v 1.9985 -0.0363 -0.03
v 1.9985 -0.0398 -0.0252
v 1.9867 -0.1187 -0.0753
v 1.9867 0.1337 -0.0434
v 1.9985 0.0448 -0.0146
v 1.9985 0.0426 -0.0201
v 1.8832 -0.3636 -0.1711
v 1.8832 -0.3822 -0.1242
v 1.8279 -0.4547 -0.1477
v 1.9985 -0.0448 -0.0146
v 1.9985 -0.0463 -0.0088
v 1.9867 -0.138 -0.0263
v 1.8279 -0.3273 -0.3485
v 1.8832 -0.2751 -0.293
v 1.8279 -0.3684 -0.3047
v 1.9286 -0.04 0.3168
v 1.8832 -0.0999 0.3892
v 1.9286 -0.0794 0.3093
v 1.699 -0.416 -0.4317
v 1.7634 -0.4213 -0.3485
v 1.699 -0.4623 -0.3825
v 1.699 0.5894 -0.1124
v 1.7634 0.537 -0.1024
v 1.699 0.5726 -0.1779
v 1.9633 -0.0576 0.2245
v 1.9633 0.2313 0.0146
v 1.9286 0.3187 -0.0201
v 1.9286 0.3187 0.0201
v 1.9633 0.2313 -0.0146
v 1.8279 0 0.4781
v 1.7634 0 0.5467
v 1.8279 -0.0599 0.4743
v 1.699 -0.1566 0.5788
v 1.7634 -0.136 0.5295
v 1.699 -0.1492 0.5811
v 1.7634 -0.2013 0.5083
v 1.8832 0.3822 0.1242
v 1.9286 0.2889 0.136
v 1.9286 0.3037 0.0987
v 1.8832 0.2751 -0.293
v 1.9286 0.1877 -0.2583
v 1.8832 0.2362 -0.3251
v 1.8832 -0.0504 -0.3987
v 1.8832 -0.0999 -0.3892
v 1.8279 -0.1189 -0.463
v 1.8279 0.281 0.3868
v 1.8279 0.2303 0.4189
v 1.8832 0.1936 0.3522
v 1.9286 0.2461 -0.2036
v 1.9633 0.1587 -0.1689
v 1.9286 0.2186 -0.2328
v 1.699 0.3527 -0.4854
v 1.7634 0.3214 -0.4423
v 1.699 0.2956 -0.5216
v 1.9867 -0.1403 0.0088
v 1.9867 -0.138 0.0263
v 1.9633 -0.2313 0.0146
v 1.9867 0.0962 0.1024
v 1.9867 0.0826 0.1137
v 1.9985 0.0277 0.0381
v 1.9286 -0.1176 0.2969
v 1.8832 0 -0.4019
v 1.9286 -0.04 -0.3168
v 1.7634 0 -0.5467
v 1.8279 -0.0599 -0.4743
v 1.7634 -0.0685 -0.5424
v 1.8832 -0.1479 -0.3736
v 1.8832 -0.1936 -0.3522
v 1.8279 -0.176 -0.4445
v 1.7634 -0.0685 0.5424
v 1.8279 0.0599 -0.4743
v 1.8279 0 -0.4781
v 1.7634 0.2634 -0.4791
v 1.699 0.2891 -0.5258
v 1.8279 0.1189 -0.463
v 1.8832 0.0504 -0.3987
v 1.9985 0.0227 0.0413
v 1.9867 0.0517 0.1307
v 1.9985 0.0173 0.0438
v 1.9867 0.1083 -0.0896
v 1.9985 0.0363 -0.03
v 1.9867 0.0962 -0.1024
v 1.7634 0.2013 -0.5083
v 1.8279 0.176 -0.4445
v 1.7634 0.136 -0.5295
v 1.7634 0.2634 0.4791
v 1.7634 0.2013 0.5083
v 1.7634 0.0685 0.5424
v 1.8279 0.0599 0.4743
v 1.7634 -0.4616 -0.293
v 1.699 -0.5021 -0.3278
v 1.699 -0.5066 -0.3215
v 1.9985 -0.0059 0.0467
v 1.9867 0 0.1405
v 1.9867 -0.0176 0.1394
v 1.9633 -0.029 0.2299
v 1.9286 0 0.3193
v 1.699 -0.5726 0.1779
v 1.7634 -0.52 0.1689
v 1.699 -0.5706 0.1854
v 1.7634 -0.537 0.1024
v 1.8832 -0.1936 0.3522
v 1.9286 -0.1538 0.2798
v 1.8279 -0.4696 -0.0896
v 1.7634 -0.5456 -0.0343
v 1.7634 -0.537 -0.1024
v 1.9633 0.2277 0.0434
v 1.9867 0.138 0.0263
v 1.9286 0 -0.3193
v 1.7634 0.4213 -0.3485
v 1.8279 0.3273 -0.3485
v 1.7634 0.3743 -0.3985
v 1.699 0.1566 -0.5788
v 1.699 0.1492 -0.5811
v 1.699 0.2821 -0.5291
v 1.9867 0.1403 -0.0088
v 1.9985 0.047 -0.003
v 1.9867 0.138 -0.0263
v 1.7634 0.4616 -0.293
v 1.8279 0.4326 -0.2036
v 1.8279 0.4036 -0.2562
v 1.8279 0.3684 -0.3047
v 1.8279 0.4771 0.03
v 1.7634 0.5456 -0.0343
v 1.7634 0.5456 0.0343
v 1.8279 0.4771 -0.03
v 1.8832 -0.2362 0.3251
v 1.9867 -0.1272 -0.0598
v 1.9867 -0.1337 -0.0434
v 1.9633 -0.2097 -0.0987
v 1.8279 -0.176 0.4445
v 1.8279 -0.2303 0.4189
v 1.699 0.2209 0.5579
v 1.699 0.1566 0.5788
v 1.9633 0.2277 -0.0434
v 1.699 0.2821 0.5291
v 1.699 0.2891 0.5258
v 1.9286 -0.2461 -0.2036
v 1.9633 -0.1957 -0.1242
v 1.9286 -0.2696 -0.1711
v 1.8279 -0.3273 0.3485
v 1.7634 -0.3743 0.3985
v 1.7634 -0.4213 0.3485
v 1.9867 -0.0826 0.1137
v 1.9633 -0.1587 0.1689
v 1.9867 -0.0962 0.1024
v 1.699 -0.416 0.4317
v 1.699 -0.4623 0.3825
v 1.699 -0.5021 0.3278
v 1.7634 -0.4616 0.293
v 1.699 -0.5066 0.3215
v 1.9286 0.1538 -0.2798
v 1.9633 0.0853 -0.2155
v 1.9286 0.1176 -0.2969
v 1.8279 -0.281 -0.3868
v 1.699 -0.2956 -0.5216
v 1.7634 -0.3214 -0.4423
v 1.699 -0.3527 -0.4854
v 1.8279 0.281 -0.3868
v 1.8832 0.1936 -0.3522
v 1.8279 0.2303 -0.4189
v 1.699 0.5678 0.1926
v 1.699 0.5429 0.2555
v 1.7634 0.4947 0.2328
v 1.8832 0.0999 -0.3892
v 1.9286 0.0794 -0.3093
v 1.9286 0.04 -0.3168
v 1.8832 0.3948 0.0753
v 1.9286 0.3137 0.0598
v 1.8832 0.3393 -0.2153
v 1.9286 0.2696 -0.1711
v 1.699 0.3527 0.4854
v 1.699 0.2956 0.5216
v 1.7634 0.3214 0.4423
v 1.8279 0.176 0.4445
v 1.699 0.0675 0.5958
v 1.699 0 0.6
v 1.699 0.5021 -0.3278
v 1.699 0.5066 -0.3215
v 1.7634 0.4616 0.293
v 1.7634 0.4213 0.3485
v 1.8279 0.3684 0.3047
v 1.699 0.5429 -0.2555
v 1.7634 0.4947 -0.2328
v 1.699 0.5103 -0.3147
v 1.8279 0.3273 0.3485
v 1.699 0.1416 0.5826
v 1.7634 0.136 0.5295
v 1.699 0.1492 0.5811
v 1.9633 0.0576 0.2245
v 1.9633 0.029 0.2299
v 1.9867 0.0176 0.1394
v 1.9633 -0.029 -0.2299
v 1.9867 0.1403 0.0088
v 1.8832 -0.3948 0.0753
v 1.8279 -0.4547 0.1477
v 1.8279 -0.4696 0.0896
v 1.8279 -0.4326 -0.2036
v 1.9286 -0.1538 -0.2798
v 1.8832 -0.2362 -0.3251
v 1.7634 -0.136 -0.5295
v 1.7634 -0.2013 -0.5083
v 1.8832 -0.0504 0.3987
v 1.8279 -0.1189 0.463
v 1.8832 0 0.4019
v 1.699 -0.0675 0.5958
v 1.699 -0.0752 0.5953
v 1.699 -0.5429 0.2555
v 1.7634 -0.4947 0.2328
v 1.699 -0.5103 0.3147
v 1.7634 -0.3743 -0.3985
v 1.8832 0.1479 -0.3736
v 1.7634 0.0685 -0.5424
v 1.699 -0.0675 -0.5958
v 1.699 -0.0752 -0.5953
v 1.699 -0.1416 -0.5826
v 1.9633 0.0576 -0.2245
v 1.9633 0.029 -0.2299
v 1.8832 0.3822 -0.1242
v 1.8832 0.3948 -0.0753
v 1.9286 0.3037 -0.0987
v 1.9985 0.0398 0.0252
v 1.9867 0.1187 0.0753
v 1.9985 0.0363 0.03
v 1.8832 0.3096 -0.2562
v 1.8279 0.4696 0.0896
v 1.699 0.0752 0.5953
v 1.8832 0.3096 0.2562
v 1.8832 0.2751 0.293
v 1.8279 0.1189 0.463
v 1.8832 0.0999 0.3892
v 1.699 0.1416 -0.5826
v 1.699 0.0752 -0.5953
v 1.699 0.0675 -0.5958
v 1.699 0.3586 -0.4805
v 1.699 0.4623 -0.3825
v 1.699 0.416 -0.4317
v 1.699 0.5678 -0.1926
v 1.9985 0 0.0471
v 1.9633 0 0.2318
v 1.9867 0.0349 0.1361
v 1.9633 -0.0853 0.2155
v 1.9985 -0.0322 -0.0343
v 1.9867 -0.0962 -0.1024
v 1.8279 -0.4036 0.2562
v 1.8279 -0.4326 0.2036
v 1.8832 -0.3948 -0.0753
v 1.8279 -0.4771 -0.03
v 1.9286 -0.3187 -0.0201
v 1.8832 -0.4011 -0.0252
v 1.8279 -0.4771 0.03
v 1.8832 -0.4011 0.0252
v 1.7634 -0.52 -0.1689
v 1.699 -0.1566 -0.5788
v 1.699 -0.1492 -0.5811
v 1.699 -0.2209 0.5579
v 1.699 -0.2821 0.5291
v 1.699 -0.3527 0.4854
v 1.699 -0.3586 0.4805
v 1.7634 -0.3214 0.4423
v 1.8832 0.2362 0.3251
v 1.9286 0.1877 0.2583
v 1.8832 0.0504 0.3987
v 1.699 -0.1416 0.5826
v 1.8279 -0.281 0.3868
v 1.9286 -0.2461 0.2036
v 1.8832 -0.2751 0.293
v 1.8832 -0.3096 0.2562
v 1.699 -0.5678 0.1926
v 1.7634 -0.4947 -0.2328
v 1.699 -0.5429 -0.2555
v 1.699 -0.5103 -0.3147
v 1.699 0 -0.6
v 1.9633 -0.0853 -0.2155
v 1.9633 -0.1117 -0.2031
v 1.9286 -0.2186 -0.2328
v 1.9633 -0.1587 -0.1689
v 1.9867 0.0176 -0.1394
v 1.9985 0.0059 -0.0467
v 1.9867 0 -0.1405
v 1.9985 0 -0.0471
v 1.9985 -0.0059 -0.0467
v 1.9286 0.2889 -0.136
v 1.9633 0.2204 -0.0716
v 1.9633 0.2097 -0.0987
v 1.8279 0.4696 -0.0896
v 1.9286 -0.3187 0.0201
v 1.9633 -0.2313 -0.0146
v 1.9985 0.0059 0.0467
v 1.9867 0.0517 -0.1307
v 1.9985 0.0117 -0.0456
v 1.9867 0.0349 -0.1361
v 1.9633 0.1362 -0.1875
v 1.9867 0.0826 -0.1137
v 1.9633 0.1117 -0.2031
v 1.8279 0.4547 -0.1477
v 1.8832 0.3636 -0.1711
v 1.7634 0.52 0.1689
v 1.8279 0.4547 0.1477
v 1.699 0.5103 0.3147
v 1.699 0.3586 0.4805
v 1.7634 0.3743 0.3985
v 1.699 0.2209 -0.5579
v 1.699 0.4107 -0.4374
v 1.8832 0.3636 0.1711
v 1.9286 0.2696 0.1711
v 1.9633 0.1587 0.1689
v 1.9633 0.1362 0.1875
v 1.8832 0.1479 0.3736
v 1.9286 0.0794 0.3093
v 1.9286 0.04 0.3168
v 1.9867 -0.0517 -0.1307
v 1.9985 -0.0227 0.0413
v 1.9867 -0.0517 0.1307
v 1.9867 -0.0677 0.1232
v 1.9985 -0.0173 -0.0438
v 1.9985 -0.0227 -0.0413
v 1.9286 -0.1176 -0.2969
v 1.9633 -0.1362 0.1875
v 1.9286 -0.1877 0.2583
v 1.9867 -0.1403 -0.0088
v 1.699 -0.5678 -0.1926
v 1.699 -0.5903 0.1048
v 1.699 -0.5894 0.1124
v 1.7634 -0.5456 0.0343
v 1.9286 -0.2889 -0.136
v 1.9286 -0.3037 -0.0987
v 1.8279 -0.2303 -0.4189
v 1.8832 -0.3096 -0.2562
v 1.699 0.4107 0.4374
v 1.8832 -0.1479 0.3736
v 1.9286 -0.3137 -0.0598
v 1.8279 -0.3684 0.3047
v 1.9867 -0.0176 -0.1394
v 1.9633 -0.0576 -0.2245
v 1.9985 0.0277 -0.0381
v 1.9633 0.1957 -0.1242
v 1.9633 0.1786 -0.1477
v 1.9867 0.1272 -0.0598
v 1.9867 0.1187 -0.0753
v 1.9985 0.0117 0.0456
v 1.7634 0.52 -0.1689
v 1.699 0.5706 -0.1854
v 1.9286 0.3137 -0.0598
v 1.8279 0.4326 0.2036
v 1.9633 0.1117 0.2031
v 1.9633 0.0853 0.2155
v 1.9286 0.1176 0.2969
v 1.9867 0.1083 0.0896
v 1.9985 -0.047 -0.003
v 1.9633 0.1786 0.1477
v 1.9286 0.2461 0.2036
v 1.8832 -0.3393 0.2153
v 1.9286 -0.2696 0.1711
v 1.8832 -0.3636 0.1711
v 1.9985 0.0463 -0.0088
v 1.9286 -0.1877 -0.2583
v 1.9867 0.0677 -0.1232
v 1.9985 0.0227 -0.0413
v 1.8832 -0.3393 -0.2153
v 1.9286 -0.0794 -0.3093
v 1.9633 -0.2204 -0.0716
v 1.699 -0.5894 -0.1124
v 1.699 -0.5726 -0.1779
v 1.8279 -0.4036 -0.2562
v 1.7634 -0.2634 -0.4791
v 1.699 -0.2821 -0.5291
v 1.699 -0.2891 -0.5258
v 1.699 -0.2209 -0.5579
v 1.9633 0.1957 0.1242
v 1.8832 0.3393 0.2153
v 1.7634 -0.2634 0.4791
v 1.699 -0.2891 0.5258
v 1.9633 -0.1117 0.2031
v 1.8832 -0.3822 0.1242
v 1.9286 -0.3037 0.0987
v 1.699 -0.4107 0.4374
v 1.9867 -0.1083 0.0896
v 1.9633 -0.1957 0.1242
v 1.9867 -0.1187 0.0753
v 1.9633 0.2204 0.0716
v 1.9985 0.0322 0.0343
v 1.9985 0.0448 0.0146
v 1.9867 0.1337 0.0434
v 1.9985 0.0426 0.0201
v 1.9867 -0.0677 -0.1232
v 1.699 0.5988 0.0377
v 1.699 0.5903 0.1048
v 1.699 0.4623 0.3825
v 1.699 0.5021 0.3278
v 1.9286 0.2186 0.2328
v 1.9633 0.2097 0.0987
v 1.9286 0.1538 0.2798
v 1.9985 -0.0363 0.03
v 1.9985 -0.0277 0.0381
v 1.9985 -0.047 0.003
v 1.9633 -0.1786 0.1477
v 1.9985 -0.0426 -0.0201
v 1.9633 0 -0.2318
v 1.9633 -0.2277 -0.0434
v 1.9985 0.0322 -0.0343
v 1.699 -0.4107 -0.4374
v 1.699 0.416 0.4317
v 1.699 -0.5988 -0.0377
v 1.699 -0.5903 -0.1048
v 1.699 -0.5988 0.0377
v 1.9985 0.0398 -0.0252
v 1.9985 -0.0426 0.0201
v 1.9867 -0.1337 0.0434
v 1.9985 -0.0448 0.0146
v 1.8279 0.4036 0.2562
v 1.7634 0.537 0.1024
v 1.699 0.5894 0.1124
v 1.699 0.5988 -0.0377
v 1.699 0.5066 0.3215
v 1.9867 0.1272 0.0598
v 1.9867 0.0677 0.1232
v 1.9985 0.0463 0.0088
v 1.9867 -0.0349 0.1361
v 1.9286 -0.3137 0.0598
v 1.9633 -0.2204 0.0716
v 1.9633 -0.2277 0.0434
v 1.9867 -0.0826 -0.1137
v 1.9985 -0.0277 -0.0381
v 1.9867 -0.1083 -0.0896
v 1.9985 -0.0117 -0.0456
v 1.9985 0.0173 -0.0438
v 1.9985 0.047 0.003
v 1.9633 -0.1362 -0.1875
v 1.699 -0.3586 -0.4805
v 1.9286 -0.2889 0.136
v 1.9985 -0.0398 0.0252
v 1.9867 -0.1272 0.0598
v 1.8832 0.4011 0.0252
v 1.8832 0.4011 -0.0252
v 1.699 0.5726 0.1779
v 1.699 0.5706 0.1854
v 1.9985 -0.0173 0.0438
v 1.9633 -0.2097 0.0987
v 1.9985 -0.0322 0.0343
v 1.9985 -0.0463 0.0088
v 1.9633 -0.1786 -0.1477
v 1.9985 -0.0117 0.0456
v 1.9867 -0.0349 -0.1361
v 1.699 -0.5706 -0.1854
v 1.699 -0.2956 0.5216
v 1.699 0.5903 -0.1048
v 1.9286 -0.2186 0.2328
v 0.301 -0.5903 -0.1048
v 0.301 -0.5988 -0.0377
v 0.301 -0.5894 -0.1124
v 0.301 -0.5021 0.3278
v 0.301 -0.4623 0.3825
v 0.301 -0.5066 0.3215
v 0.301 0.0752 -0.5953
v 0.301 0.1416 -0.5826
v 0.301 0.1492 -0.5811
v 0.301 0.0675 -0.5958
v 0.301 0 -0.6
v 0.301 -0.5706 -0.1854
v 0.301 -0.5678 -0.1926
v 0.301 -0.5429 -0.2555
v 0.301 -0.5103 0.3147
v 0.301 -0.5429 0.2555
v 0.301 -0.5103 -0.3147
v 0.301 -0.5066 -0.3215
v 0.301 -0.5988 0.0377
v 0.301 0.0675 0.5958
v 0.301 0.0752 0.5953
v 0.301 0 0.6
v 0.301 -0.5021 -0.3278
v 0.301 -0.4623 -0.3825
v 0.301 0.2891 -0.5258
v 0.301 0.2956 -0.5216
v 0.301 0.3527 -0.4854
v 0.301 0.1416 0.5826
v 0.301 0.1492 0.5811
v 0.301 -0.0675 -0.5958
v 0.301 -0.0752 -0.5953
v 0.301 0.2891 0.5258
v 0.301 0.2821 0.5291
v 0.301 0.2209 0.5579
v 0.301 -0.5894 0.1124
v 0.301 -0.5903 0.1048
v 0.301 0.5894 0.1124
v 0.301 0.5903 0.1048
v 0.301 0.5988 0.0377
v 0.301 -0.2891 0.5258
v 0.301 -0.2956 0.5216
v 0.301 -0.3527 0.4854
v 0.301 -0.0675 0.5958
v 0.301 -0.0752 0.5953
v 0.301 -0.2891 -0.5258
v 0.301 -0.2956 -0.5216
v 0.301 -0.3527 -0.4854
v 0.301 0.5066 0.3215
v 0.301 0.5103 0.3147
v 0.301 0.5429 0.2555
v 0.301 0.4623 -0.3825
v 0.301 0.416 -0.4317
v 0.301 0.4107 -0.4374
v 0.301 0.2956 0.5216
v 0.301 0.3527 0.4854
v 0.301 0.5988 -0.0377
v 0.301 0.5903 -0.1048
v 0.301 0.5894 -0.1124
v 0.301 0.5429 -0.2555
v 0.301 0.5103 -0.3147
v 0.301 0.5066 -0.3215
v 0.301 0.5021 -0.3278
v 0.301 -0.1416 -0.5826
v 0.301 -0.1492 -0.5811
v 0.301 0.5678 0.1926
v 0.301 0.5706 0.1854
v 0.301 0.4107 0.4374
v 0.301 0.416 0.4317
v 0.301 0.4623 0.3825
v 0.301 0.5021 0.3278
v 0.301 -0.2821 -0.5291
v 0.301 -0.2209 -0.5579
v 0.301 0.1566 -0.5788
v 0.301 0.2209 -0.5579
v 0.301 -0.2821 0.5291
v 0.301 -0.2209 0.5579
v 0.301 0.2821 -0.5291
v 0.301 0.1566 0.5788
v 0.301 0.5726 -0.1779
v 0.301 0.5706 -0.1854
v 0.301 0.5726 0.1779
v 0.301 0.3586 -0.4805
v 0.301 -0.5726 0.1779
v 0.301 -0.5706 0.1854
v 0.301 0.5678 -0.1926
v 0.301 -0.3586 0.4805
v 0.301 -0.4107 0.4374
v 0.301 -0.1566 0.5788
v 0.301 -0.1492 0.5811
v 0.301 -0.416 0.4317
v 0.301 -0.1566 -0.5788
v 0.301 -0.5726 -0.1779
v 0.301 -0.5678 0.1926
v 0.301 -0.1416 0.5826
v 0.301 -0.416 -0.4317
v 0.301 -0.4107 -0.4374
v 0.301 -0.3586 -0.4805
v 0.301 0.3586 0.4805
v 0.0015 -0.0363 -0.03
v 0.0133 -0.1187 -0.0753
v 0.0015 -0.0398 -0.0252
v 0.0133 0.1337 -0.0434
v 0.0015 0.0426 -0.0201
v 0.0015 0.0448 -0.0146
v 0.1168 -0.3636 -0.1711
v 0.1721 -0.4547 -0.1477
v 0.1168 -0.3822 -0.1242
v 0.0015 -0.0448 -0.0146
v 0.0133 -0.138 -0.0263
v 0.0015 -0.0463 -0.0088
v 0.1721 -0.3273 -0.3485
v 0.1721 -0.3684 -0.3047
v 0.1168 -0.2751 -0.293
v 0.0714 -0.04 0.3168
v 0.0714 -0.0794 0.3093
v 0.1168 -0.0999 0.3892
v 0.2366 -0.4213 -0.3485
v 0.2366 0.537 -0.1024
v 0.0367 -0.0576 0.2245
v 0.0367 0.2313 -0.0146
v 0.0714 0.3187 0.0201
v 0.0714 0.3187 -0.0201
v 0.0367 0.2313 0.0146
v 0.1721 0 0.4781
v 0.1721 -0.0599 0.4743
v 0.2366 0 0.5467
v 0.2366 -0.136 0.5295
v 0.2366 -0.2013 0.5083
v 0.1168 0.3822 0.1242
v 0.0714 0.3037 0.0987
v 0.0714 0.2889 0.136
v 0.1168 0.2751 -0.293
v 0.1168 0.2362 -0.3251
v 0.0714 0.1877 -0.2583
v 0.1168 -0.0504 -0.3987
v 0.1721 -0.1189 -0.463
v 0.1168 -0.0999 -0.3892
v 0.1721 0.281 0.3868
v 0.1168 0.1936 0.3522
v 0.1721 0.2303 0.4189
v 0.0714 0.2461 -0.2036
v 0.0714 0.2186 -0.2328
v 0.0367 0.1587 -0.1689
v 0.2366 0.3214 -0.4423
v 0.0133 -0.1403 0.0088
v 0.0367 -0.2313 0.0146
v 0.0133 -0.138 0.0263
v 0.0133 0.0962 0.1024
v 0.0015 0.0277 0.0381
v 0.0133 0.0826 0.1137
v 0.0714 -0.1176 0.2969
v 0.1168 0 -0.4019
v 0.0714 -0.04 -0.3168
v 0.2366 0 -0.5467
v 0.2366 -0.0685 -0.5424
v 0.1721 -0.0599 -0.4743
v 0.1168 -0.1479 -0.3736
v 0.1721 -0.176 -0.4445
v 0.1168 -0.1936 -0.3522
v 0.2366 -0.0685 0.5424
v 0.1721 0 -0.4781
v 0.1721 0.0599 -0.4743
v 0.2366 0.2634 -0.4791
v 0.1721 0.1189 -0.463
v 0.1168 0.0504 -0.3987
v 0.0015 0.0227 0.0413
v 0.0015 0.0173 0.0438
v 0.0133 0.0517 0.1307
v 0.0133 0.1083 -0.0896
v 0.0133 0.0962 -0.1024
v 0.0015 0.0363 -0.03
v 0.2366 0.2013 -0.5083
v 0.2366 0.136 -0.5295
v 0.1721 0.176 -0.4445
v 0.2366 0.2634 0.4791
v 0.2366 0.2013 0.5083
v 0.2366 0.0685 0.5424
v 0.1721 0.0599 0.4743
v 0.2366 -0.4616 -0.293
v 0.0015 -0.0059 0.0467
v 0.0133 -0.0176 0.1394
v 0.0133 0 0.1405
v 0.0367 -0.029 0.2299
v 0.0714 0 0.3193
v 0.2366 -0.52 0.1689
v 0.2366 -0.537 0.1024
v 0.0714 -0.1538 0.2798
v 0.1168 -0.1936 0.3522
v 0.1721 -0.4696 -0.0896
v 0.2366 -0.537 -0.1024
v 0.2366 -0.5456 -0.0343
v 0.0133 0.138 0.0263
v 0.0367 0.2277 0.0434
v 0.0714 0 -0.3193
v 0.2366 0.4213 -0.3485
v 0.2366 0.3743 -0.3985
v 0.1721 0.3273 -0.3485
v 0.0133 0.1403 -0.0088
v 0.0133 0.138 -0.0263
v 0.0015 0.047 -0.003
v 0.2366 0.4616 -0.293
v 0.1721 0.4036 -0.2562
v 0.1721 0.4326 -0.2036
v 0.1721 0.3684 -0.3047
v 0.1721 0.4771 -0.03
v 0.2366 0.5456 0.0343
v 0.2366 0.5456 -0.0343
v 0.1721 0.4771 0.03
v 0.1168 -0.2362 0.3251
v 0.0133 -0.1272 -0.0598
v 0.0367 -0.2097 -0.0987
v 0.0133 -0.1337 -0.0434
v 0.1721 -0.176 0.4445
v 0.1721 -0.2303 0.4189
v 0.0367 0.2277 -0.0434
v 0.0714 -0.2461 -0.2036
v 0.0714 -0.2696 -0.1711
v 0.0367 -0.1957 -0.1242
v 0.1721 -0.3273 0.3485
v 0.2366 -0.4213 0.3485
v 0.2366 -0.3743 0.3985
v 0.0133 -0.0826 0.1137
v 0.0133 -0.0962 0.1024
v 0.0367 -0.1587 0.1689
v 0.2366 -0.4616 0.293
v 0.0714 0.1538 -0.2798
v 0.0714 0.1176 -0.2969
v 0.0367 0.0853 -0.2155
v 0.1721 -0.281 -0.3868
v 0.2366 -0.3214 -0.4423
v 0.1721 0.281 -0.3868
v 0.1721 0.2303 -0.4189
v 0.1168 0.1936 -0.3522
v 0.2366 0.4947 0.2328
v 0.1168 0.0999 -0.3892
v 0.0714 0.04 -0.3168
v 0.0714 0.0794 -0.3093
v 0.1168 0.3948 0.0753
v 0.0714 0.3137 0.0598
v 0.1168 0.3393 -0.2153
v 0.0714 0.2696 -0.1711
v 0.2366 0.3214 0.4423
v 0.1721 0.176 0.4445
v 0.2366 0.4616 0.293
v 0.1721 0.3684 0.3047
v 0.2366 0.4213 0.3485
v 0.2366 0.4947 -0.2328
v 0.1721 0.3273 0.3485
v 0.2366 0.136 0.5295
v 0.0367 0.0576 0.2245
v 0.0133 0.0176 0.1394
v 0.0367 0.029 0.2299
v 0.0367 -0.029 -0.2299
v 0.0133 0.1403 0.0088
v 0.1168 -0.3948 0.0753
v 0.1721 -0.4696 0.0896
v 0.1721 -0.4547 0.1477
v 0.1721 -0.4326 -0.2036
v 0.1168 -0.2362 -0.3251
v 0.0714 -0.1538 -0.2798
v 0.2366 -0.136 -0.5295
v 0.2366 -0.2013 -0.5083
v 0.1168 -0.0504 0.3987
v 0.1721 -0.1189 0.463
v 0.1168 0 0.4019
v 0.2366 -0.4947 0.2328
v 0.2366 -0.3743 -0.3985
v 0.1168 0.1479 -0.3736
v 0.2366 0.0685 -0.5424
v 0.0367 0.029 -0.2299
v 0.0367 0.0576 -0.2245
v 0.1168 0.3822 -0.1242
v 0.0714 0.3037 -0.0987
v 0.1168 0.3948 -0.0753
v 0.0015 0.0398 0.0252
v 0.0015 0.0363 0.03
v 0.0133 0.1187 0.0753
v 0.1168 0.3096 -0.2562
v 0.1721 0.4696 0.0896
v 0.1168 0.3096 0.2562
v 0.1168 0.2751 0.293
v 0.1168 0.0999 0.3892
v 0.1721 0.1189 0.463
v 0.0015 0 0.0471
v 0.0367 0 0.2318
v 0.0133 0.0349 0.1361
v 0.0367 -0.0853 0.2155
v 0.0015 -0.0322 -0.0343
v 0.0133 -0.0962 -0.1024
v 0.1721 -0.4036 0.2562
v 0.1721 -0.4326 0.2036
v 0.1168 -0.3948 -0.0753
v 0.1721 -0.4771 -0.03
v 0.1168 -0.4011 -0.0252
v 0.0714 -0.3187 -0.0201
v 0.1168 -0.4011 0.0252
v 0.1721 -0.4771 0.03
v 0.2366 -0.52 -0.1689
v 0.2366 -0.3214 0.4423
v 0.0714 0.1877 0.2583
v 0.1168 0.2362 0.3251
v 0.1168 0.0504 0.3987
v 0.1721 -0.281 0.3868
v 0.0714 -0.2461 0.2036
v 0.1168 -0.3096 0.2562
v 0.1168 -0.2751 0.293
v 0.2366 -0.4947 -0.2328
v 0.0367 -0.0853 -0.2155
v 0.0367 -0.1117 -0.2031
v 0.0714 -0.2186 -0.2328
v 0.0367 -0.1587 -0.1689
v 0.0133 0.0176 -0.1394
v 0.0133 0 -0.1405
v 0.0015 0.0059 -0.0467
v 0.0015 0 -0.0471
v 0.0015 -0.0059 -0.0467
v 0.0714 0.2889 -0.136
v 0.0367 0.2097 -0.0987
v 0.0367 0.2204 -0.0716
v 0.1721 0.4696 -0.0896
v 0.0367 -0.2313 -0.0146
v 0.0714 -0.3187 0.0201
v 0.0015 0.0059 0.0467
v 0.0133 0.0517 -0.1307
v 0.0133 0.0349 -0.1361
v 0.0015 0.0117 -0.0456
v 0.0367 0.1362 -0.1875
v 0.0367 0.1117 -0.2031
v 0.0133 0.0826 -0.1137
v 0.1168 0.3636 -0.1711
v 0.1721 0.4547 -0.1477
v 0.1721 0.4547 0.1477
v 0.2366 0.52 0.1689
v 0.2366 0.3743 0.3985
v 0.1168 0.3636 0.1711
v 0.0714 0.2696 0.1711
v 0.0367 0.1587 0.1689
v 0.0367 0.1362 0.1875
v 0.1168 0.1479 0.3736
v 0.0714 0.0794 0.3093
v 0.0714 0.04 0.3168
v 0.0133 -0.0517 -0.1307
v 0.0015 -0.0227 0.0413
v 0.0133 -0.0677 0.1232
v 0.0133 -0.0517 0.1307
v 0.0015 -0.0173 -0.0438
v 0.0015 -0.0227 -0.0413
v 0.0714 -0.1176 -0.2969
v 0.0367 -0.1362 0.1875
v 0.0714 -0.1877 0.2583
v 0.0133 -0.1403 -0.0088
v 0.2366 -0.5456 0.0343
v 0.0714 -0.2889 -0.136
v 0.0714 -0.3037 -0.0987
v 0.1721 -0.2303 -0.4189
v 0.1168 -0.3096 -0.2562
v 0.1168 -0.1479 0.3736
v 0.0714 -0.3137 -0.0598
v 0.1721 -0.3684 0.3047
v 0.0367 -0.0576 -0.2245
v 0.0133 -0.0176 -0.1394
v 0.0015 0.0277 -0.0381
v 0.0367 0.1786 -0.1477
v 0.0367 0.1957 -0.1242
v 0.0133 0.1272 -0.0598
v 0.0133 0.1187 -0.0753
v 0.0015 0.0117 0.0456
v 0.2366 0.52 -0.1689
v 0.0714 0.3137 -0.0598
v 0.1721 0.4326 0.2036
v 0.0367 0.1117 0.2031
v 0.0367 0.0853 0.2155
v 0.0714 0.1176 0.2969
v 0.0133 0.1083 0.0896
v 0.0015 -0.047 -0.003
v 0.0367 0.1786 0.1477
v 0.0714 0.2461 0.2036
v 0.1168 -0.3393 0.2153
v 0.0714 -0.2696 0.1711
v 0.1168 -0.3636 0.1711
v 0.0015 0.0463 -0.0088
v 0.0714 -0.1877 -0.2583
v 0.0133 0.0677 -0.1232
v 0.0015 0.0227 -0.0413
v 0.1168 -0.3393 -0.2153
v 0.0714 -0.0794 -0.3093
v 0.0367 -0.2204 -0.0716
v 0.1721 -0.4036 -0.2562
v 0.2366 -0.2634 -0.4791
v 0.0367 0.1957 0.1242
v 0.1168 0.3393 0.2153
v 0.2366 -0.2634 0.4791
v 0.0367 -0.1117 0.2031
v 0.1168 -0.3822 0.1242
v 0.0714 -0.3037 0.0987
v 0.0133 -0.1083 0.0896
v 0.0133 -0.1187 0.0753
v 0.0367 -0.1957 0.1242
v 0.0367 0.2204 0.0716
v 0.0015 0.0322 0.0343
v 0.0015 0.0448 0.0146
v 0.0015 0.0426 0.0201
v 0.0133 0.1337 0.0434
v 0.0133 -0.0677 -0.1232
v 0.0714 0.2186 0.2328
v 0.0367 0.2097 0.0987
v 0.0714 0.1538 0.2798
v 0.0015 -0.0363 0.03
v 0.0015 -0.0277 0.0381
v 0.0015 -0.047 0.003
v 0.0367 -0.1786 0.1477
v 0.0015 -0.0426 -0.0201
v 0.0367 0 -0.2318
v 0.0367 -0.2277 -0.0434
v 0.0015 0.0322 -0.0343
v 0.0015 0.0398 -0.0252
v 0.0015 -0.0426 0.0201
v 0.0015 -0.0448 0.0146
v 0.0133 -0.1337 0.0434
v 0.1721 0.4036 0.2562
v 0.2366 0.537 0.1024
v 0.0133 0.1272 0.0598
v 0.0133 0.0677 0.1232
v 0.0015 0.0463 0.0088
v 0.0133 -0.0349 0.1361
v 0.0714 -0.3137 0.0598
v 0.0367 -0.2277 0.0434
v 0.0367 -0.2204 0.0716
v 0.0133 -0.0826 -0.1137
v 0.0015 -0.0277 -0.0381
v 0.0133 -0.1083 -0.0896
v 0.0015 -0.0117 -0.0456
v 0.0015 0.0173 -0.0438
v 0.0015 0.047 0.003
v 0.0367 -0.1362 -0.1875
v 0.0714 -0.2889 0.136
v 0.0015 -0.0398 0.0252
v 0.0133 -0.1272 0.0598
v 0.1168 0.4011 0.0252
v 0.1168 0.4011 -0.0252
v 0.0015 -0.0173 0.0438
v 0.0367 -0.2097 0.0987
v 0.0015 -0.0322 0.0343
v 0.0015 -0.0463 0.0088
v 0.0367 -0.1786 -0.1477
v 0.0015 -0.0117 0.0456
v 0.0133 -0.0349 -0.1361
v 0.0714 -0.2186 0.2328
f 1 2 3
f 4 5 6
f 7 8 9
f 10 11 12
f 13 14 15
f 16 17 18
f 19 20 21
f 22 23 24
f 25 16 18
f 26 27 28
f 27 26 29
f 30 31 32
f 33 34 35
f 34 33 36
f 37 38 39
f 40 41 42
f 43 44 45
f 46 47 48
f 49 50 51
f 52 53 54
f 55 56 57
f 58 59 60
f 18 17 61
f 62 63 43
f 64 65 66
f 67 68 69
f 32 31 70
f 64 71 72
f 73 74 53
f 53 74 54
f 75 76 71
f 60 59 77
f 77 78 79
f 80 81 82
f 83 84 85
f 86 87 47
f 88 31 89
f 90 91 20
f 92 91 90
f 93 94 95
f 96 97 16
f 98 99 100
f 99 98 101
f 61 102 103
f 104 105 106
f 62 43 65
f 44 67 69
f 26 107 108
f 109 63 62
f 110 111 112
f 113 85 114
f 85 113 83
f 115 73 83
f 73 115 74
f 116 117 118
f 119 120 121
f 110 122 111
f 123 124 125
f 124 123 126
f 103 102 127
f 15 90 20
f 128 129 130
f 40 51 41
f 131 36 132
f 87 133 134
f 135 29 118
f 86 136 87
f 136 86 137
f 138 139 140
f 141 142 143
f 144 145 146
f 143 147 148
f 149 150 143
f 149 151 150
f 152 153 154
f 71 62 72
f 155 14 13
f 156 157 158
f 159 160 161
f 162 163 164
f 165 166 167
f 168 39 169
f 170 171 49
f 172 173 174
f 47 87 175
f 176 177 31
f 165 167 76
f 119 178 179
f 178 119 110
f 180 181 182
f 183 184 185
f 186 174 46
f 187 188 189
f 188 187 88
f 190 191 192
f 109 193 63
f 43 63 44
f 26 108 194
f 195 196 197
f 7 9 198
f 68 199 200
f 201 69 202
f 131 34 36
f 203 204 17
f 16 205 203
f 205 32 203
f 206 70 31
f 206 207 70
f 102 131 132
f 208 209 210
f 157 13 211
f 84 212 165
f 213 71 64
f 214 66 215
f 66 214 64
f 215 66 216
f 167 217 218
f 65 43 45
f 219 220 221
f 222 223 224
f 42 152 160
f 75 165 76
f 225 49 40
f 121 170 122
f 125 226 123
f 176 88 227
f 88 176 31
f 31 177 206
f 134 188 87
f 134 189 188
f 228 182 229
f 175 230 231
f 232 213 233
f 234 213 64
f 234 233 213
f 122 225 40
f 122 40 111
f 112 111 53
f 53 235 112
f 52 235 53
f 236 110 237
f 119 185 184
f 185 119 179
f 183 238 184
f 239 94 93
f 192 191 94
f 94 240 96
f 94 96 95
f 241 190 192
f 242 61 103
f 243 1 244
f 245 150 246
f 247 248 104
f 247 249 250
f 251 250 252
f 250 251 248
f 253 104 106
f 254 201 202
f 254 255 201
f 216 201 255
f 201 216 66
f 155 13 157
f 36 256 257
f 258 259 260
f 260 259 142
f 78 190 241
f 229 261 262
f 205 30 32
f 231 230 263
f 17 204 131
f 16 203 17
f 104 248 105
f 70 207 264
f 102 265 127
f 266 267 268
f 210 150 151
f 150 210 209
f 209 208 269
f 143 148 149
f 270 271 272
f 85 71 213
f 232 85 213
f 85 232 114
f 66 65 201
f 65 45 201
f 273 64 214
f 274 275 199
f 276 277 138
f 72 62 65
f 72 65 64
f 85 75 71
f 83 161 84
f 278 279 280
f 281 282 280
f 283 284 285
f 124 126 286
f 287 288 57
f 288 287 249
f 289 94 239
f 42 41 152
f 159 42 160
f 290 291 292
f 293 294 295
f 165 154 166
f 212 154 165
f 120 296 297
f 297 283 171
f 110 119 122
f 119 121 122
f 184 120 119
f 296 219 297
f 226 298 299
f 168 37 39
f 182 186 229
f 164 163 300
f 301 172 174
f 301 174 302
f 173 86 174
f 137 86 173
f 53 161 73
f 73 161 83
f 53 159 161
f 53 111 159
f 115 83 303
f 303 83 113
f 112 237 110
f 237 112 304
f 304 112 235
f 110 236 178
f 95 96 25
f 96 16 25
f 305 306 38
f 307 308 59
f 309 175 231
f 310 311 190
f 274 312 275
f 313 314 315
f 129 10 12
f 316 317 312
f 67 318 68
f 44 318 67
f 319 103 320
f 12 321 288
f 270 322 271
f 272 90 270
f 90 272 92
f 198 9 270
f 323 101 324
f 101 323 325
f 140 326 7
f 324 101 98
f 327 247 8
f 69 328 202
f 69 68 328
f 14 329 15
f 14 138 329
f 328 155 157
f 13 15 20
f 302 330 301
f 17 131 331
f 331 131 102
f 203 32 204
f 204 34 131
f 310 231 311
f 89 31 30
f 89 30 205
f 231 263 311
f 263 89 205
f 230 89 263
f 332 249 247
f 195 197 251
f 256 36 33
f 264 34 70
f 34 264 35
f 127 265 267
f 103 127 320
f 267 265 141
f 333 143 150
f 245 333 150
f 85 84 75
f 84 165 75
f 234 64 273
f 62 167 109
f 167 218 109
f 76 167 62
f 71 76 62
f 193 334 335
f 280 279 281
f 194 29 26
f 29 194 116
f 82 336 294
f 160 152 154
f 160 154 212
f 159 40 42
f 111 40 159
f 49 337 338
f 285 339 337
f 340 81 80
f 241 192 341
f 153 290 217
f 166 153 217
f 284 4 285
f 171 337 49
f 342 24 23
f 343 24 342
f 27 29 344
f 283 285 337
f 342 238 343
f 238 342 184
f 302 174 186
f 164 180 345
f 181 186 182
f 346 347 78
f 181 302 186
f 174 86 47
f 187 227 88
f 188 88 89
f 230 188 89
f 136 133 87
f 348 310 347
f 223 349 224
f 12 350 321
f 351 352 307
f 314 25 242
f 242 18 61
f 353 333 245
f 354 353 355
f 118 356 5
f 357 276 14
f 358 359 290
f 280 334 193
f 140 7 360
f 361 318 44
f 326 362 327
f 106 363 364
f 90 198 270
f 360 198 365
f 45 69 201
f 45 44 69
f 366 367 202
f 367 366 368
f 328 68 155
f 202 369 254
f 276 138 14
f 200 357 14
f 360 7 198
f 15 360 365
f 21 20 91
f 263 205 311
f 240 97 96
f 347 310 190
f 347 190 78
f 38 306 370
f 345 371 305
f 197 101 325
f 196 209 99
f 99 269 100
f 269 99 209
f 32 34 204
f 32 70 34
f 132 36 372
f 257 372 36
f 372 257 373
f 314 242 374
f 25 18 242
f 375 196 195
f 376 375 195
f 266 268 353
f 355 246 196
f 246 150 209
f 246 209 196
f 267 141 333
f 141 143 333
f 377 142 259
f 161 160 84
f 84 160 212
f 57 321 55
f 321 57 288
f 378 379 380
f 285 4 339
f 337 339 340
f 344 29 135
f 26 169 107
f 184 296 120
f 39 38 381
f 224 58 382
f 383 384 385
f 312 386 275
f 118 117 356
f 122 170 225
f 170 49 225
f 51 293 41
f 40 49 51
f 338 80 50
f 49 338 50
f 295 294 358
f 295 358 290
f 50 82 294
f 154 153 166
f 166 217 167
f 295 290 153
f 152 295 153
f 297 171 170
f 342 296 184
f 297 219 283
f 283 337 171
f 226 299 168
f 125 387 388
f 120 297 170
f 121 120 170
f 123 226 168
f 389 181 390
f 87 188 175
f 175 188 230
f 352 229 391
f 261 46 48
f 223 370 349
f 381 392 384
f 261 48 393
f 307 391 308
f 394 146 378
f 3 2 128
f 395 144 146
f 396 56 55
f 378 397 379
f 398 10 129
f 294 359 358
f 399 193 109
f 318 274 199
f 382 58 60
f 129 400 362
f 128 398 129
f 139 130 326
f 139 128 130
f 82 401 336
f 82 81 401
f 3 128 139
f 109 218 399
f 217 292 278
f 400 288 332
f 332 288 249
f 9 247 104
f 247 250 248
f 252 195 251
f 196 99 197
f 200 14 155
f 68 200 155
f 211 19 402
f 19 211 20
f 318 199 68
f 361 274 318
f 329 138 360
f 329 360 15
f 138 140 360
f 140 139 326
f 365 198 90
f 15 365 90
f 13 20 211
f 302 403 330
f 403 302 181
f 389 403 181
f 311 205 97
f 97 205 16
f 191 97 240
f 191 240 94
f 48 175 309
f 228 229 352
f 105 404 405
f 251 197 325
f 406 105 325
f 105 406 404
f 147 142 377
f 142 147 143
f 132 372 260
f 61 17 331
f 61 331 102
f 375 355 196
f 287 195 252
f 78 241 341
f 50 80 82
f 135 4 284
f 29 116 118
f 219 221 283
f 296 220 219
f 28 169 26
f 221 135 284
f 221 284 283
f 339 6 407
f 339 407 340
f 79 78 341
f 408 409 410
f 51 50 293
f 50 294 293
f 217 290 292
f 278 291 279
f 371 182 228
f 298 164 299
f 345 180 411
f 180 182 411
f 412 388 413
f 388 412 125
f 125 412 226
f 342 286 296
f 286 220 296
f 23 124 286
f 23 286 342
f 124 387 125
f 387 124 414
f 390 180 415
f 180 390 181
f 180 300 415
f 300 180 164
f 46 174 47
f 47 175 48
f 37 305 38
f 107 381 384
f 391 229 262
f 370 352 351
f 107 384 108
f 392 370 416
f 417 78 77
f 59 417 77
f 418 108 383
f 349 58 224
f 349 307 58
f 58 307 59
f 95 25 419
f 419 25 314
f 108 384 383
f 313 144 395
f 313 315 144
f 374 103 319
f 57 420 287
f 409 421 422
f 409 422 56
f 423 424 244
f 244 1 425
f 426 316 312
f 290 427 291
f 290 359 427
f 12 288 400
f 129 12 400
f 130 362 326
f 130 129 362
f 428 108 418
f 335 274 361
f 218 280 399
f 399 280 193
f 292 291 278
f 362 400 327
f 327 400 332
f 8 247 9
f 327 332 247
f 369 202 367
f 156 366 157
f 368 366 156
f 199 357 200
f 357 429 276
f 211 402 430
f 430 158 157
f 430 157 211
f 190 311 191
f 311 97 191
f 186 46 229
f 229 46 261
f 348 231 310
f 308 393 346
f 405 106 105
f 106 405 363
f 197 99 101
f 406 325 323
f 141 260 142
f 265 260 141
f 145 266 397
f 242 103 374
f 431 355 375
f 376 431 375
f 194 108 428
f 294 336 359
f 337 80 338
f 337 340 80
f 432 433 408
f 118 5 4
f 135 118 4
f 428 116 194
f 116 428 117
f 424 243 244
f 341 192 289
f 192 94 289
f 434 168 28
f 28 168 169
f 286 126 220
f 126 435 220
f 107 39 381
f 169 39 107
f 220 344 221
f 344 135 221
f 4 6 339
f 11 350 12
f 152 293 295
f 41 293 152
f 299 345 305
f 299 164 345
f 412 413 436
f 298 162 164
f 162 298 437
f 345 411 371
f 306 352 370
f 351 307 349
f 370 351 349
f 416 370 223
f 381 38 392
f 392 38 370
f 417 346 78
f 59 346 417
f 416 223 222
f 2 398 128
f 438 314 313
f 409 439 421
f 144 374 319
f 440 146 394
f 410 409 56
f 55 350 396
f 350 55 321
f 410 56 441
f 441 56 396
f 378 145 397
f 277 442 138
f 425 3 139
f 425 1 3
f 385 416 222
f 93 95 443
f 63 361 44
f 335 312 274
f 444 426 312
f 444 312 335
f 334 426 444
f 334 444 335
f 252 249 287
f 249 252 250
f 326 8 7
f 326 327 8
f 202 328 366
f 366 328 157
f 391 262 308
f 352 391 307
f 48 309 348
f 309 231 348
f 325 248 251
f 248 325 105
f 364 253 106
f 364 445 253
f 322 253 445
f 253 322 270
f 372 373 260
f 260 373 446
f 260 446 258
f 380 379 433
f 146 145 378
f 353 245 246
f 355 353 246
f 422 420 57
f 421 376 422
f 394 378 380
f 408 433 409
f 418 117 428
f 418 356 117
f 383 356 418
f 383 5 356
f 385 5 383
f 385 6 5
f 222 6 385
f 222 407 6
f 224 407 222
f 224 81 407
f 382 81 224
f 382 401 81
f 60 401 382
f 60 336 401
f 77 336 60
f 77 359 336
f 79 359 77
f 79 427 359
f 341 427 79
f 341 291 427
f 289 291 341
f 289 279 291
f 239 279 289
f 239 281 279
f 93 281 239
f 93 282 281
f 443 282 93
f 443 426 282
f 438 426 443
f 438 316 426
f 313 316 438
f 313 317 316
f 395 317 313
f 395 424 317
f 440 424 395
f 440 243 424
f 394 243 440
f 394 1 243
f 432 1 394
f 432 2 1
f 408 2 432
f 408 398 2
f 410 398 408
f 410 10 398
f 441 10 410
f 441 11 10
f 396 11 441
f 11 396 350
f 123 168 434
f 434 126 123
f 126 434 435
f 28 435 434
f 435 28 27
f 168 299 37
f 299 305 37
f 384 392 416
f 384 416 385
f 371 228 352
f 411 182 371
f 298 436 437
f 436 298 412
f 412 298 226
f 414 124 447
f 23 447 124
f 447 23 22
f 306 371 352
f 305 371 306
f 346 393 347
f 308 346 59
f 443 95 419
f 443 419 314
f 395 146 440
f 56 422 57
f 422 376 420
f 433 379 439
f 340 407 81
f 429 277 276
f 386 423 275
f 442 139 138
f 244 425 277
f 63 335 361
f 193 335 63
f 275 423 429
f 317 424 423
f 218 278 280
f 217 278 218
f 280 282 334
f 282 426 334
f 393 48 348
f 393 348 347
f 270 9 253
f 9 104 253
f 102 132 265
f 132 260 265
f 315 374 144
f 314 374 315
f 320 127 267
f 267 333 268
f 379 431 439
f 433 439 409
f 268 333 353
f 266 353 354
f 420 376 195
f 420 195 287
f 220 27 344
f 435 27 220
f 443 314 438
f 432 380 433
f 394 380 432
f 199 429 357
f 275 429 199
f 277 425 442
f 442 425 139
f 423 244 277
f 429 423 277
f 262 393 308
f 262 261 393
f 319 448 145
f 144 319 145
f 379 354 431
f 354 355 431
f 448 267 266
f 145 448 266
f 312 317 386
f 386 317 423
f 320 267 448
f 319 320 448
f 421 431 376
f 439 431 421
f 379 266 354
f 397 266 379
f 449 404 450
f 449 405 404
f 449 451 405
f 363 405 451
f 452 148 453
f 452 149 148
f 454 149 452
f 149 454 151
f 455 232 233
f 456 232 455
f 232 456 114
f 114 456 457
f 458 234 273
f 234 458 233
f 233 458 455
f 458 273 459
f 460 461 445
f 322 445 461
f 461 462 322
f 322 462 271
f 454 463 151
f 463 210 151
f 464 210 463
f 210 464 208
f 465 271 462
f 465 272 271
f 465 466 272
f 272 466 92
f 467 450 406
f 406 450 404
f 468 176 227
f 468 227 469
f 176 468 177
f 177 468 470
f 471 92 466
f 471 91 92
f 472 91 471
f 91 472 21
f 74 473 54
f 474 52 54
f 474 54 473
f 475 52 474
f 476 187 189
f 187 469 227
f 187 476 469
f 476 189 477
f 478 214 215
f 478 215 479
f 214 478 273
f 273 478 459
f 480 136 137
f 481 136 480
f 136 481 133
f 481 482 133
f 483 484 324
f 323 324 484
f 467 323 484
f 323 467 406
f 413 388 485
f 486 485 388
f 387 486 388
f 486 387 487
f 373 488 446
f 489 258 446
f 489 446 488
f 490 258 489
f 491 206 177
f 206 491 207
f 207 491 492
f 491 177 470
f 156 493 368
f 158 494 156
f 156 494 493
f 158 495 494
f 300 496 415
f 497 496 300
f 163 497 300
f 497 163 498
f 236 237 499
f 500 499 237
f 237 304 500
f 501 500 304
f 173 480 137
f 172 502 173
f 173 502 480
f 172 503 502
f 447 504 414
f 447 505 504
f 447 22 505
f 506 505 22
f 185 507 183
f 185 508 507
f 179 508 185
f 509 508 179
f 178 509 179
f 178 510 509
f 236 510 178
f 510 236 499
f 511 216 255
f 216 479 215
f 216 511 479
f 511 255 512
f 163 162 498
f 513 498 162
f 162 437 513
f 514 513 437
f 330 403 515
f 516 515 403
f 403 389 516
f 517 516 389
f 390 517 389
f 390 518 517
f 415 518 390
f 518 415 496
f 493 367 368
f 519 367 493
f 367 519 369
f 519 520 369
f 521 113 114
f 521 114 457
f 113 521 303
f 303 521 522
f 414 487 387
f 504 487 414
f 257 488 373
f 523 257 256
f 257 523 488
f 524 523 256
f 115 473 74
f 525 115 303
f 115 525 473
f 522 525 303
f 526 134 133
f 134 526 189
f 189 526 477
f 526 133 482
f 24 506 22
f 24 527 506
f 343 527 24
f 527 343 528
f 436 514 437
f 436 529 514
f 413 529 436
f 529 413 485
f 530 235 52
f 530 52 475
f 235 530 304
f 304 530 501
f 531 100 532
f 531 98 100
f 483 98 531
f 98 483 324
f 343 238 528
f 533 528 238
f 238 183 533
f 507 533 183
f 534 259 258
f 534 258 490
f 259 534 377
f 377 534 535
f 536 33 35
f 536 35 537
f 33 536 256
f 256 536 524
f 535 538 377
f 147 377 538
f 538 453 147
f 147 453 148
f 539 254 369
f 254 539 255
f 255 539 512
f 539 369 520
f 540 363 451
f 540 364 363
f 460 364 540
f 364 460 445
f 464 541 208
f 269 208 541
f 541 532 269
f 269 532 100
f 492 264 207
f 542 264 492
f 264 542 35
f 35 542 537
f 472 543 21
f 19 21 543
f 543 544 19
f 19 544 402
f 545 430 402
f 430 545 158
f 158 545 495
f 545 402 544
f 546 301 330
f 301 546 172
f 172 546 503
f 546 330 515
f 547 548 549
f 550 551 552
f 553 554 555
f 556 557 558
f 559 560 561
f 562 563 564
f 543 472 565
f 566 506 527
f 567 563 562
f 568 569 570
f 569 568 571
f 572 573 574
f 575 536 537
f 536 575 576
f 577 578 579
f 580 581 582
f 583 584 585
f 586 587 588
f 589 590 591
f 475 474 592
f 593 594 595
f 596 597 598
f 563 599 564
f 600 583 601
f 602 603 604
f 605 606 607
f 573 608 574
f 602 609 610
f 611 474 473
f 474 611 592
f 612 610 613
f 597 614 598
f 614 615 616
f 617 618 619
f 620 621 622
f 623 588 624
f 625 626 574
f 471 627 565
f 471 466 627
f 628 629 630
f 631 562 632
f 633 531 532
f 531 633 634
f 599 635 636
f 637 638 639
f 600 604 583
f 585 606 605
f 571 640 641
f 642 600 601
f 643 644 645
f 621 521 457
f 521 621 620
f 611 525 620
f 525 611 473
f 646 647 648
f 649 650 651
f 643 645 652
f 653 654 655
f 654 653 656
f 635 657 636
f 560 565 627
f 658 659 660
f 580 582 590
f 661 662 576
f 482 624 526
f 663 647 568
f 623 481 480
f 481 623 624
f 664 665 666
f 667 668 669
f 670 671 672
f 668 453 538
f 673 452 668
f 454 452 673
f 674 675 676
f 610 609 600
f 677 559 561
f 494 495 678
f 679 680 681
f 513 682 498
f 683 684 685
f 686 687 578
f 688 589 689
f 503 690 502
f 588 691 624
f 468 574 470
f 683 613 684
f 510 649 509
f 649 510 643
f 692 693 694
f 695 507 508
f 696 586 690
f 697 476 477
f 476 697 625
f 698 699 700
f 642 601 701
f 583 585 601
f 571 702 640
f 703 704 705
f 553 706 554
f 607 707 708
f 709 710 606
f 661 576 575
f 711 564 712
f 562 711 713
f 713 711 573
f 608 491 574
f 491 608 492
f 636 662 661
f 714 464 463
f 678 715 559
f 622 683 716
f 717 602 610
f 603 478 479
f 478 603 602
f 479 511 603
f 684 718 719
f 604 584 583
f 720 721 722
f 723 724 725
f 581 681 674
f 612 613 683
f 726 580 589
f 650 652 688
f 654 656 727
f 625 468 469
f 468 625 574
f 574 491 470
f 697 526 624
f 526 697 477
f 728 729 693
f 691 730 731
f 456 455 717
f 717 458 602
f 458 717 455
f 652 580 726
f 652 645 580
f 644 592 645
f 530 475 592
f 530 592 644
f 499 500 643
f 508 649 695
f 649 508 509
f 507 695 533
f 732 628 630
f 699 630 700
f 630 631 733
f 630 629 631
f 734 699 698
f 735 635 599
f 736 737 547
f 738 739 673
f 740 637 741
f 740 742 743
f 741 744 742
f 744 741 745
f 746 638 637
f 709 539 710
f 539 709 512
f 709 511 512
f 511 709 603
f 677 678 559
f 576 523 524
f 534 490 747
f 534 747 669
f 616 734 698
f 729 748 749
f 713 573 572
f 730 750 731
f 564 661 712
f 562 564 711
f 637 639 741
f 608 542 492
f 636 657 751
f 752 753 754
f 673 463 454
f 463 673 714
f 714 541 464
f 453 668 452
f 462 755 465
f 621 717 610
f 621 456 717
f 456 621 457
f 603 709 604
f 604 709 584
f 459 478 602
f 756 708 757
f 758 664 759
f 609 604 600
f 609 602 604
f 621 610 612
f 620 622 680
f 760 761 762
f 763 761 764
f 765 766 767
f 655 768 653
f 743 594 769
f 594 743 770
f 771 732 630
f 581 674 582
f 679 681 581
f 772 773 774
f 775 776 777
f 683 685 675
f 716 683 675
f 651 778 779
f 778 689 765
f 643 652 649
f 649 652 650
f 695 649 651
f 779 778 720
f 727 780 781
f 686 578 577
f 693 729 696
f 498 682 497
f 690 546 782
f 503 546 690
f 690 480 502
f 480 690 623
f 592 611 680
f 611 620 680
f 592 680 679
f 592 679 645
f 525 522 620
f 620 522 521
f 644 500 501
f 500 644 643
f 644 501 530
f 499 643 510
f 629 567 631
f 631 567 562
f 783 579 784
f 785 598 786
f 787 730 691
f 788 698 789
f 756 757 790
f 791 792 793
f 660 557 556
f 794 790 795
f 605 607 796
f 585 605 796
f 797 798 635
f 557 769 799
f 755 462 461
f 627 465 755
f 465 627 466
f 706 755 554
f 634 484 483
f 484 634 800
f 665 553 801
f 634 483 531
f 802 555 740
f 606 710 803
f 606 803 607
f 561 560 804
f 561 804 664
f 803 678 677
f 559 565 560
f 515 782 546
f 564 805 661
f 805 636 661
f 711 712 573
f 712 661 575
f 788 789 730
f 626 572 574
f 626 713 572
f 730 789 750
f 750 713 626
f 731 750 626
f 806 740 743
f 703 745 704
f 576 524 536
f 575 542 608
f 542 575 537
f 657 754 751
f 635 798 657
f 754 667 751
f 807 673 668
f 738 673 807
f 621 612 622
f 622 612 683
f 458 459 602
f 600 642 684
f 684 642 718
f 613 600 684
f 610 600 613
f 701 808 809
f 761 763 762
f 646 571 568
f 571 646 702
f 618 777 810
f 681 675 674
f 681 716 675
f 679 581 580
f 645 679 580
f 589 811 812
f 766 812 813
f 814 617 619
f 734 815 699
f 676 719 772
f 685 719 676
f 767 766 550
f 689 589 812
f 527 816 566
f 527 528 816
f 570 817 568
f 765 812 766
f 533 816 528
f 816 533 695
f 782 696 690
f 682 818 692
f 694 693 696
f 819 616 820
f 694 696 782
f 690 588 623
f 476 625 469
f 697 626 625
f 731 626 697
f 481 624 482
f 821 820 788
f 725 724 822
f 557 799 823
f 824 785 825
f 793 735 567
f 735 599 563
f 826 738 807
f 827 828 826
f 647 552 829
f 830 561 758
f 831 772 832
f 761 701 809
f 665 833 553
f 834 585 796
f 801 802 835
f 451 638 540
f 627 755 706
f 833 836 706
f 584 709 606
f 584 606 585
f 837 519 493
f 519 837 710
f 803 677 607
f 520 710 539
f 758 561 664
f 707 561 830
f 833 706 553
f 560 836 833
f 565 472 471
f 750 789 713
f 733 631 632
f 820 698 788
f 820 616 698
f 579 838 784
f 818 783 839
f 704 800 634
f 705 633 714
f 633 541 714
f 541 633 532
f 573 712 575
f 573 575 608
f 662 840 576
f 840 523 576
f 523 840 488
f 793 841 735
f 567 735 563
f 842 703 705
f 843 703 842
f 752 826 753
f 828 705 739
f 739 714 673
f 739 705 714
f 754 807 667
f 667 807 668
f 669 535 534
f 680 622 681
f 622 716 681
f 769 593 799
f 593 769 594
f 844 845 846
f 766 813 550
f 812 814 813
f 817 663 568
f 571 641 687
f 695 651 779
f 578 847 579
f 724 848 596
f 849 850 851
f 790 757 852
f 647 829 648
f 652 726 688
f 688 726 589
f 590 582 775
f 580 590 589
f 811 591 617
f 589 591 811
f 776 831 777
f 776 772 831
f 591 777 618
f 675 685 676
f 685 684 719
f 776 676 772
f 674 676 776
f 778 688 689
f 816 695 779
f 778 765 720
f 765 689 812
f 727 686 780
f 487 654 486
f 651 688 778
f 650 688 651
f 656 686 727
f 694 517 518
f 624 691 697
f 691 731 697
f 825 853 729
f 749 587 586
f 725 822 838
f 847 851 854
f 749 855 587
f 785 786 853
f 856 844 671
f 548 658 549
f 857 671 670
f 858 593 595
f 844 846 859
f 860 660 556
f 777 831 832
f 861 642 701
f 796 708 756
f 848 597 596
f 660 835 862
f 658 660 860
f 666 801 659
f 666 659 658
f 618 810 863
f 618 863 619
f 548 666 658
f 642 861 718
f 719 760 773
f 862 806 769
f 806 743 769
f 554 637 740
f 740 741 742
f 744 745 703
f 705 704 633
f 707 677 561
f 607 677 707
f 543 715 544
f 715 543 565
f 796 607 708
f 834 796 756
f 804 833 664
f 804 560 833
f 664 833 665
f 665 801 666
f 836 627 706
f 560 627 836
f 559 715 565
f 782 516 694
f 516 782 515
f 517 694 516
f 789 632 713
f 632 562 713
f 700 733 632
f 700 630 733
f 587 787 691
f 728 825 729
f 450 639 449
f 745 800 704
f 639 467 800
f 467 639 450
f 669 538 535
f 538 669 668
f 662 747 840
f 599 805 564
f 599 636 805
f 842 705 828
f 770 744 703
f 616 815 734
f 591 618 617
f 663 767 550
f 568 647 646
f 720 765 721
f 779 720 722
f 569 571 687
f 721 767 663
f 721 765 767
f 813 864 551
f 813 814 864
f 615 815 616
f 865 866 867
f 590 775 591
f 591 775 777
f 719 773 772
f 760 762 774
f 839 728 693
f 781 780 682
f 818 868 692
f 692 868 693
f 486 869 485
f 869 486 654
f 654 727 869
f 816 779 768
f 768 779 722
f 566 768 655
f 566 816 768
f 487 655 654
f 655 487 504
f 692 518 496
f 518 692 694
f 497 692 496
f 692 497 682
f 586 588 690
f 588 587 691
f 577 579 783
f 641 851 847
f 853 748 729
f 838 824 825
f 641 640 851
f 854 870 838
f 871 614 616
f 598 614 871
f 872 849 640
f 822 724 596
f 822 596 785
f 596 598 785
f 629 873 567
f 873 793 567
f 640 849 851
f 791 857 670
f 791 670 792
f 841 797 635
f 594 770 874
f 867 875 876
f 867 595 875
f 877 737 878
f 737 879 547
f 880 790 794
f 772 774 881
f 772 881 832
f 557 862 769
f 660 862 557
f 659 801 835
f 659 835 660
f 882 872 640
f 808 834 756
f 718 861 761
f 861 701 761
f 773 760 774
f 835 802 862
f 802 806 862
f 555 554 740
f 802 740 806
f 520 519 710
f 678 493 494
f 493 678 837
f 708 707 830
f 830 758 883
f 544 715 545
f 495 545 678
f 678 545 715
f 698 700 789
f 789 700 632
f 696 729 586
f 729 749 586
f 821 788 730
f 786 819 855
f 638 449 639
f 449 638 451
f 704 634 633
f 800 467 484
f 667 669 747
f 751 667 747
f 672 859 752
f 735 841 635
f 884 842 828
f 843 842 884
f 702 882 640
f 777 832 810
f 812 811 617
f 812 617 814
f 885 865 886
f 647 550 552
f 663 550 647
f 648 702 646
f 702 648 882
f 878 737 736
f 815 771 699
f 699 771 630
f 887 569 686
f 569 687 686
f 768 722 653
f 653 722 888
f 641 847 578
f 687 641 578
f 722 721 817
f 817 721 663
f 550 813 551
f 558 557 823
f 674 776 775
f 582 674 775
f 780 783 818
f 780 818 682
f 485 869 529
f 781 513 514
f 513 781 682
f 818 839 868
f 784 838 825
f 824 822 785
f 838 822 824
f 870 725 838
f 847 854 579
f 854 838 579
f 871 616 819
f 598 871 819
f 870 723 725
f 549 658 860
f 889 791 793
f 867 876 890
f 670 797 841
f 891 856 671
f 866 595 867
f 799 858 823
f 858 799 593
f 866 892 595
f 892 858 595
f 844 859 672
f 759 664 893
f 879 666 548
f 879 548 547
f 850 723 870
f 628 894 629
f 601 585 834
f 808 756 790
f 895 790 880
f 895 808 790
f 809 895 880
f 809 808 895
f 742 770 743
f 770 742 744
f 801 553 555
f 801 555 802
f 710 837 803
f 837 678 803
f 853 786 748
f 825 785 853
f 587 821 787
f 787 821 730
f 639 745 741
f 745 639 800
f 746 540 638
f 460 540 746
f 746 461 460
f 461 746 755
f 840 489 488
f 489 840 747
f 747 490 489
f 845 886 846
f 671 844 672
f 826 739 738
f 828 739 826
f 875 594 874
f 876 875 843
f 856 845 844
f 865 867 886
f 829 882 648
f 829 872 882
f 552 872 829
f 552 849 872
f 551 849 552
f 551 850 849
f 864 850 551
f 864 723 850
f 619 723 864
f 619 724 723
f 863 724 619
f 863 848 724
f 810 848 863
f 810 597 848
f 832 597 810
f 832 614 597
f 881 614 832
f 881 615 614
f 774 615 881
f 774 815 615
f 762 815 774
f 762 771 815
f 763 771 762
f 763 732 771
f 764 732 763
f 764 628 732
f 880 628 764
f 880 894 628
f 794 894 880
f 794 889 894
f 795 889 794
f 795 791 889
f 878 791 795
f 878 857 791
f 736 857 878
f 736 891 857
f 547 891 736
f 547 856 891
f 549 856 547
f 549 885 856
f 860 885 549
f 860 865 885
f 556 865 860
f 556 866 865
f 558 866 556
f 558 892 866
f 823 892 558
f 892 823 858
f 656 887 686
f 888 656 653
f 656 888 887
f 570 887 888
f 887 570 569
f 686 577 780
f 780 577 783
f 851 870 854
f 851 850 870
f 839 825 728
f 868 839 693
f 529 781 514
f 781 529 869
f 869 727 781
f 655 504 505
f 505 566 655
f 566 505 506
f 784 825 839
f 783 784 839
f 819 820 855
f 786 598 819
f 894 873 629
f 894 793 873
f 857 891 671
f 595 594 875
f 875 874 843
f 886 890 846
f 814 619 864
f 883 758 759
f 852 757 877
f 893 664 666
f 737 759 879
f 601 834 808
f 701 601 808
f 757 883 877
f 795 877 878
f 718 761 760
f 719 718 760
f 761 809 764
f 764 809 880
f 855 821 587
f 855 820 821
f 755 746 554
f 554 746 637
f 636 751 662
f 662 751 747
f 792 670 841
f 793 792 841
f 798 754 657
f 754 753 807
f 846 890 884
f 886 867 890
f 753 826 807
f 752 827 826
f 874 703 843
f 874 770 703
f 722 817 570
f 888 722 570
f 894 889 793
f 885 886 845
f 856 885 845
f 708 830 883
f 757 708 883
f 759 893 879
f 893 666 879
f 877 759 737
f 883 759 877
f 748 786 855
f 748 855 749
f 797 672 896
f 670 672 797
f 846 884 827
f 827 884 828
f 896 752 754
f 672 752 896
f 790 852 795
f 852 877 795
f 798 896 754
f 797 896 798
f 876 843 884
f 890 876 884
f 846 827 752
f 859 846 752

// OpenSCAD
$fn=50;  // REMOVE
DO = 1.2; // REMOVE
PARAM1 = 0.75; // REMOVE
LENGTH = 2.0; // REMOVE
rotate([0,90,0])
translate([0,0,(LENGTH)/2])
union()
{
    union()
    {
        intersection()
        {
            translate([0,0,(LENGTH)/2]) translate([0,0,-(PARAM1)]) sphere(r=(PARAM1));
            cylinder(h = (LENGTH)/2, r = (DO)/2);
        }
        cylinder(h = (LENGTH)/2-(PARAM1), r=(DO)/2);
    }
    mirror([0,0,1])
    union()
    {
        intersection()
        {
            translate([0,0,(LENGTH)/2]) translate([0,0,-(PARAM1)]) sphere(r=(PARAM1));
            cylinder(h = (LENGTH)/2, r = (DO)/2);
        }
        cylinder(h = (LENGTH)/2-(PARAM1), r=(DO)/2);
    }
}
